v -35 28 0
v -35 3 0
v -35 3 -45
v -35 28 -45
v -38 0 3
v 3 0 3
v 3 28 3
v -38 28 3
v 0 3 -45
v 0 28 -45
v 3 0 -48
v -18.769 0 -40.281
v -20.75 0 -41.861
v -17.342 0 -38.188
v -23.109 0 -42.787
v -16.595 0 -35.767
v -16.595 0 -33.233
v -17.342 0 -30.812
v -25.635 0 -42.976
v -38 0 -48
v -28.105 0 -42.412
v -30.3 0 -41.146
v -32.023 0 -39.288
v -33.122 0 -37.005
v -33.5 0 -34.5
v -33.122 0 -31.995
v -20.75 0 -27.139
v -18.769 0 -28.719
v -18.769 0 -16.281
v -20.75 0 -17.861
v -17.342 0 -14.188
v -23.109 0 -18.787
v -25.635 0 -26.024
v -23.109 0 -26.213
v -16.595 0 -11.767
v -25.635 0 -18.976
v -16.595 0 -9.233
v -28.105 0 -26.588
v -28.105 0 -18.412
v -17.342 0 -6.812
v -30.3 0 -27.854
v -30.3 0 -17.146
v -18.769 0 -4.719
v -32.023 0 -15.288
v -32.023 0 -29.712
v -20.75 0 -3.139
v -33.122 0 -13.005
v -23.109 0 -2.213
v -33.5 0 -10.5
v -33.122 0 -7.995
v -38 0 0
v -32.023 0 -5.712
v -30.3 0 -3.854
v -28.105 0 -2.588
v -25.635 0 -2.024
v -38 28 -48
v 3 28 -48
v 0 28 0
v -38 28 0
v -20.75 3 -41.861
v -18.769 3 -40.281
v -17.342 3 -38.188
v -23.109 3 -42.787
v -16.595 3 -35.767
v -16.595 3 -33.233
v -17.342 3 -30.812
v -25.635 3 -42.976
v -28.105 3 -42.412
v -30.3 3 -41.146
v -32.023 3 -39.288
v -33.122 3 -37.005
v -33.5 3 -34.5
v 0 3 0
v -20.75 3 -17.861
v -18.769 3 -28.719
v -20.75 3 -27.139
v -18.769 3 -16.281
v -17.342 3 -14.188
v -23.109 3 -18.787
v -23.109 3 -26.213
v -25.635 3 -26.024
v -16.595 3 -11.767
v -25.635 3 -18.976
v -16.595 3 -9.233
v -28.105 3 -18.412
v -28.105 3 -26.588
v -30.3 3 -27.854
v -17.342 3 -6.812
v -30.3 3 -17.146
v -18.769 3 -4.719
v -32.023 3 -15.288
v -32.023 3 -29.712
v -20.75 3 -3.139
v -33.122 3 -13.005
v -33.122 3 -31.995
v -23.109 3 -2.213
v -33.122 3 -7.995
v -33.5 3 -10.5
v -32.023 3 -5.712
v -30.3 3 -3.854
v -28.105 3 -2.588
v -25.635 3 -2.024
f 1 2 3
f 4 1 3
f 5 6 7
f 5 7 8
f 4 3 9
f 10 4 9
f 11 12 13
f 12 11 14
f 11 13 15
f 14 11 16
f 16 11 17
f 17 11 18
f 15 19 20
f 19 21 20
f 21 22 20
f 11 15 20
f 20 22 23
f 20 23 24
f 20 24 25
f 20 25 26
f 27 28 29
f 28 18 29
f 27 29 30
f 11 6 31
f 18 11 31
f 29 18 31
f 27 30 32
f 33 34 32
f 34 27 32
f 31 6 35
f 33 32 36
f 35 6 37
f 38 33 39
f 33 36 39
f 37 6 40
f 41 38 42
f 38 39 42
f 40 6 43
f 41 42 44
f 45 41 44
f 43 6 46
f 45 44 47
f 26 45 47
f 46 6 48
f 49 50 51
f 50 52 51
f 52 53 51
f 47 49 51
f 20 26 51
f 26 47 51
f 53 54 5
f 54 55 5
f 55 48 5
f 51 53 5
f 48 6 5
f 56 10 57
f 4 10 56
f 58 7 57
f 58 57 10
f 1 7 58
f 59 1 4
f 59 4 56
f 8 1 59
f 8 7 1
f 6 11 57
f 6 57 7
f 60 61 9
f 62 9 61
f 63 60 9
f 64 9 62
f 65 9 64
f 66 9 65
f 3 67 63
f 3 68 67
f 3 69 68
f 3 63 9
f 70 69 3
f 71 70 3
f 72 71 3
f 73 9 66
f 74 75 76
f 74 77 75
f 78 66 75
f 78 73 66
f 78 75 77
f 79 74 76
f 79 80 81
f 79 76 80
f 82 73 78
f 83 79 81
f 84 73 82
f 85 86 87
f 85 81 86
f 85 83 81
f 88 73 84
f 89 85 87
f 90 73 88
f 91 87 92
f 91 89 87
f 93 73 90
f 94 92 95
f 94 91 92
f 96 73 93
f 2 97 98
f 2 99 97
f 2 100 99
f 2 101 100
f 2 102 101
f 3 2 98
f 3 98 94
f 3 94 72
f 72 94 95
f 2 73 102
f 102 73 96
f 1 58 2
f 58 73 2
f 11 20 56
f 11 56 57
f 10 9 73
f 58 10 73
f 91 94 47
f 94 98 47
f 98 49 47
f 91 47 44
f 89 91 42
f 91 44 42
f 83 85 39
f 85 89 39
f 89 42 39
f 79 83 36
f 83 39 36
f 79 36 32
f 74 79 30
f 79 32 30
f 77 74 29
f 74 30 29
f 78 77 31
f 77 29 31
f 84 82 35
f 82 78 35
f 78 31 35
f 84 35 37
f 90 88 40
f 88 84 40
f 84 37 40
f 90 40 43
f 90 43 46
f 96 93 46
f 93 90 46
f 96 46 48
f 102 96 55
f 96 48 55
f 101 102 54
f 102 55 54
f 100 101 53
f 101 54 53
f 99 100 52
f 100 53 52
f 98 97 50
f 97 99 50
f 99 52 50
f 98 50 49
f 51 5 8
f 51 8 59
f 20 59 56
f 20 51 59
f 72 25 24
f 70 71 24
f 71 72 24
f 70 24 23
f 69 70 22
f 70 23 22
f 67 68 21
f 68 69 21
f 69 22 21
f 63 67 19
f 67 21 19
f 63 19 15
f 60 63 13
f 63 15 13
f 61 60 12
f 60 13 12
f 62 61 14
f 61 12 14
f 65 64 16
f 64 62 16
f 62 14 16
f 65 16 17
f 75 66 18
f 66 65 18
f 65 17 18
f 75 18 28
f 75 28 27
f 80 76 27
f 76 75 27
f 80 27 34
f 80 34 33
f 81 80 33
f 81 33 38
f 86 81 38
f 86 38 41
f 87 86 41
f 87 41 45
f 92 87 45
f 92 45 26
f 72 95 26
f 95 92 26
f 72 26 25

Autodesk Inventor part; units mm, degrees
ref_plane "YZ Plane" through (0, 0, 0) normal (1, 0, 0) x (0, 1, 0)
ref_plane "XZ Plane" through (0, 0, 0) normal (0, 1, 0) x (-1, 0, 0)
ref_plane "XY Plane" through (0, 0, 0) normal (0, 0, 1) x (1, 0, 0)
sketch "Sketch3" plane through (0, 0, 0) normal (0, 1, 0) x (-1, 0, 0)
  line L0 (0, 0) -> (35, 0)
  line L1 (35, 0) -> (35, -45)
  line L2 (35, -45) -> (0, -45)
  line L3 (0, -45) -> (0, 0)
  circle A0 centre (25, -10.5) radius 8.5
  circle A1 centre (25, -34.5) radius 8.5
  line L4 (35, 0) -> (38, 0)
  line L5 (38, 0) -> (38, -45)
  line L6 (38, -45) -> (38, -48)
  line L7 (38, -48) -> (0, -48)
  line L8 (0, -48) -> (-3, -48)
  line L9 (-3, -48) -> (-3, 0)
  line L10 (-3, 0) -> (-3, 3)
  line L11 (-3, 3) -> (38, 3)
  line L12 (38, 3) -> (38, 0)
  dimension "d26" = 45
  dimension "d27" = 35
  dimension "d31" = 17
  dimension "d32" = 17
  dimension "d33" = 3
  dimension "d34" = 3
  dimension "d35" = 3
  dimension "d36" = 3
extrude "Extrusion3" add sketch "Sketch3" along normal blind 3 contours L0 L1 L2 L3
extrude "Extrusion4" add sketch "Sketch3" along normal blind 28 contours L5 L6 L7 L8 L9 L10 L11 L12
sketch "Sketch4" plane through (0, 28, 0) normal (0, 1, 0) x (1, 0, 0)
  line L0 (-38, 48) -> (-38, -3) projected
  line L1 (-38, -3) -> (2.7105, -3)
  line L2 (-38, -3) -> (3, -3) projected
  line L3 (3, 48) -> (-38, 48) projected
  line L4 (3, -3) -> (3, 48)
  line L5 (-38, 48) -> (3, 48)
  point P0 (0, 0)
  dimension "d41" = 51
  dimension "d43" = 41
properties part number "ultrasonido"
